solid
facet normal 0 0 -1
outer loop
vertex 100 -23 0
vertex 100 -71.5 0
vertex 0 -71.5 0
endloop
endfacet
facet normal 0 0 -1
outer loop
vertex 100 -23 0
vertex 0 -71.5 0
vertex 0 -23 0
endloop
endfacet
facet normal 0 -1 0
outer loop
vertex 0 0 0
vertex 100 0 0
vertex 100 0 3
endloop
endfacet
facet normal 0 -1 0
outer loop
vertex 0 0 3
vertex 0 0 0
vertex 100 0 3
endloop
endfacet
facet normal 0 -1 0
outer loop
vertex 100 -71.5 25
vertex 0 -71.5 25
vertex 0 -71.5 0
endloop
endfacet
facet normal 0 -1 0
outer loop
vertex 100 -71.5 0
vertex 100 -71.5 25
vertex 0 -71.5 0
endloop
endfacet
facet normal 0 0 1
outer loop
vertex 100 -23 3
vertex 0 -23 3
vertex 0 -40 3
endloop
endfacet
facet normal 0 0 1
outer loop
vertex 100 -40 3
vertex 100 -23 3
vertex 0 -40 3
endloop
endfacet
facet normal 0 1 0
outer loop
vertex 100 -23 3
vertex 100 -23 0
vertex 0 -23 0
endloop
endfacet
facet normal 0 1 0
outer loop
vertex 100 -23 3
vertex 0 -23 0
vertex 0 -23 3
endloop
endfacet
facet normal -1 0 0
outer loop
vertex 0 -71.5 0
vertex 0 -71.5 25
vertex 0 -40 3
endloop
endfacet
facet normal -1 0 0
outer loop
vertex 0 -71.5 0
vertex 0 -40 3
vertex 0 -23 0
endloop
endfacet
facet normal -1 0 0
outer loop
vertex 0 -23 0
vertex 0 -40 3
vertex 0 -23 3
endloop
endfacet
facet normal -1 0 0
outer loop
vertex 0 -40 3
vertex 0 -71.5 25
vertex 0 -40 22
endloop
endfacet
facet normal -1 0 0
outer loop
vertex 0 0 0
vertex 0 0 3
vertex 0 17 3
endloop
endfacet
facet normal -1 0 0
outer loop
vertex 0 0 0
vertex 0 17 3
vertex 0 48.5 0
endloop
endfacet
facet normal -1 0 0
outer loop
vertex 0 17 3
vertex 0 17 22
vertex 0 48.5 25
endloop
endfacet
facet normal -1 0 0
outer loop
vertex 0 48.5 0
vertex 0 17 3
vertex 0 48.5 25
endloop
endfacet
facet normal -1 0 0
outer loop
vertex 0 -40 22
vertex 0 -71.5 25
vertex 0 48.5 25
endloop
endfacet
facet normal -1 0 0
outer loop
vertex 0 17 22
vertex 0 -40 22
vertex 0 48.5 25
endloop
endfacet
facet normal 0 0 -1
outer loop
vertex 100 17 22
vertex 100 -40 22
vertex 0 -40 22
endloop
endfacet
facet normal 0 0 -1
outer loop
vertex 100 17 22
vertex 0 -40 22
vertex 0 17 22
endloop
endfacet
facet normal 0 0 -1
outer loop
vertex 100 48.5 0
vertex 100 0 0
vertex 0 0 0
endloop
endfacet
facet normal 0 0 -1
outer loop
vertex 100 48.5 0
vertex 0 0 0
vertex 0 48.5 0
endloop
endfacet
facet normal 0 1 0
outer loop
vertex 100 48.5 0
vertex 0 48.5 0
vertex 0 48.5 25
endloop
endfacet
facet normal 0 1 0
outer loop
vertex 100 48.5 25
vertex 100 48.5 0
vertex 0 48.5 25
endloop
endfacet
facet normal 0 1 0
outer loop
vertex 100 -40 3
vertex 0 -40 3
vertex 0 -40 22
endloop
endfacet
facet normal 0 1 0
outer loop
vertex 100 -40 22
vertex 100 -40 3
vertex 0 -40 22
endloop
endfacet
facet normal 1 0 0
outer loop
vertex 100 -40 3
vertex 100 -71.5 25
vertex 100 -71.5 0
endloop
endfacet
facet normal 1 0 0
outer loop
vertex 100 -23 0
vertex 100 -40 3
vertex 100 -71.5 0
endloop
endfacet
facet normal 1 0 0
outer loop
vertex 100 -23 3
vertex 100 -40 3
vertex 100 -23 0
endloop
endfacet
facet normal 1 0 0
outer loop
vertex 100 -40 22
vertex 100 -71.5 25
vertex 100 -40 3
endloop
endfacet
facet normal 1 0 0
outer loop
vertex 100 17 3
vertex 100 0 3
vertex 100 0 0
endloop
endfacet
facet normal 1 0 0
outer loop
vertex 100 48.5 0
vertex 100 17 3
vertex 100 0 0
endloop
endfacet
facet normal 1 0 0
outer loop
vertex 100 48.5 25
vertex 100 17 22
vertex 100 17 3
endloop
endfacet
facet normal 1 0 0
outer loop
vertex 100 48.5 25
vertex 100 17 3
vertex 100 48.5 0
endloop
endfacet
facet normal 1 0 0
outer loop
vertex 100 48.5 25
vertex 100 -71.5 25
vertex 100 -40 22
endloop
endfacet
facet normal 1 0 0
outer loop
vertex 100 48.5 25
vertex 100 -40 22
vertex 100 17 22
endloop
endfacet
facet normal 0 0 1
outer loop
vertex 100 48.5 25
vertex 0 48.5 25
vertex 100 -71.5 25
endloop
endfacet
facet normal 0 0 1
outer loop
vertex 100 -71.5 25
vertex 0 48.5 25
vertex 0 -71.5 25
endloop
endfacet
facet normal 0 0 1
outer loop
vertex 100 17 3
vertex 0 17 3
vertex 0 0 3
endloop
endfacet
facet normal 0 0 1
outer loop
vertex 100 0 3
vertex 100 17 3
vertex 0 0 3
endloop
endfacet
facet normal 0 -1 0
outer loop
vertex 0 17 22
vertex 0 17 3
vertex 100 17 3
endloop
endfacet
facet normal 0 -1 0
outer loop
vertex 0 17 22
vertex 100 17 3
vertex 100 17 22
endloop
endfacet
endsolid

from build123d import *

# Parameters (mm, degrees)
F0_W     = 17
F0_H     = 3
F0_W_2   = 57
F0_W_3   = 28.5
F0_H_2   = 19
F1_DEPTH = 100


# Not quite as in the source:
# - a feature of the source that left no trace in its solid (it failed there, or was rolled back) is left out


with BuildPart() as f1:
    # F0 (on Right) → F1 (new body)
    with BuildSketch(Plane.YZ):
        with Locations((-31.5, 1.5)):
            Rectangle(F0_W, F0_H)
        Polygon((-68.5, 22), (-40, 22), (-40, 25), (-71.5, 25), (-71.5, 0), (-40, 0), (-40, 3), (-68.5, 3), align=None)
        with Locations((-11.5, 23.5)):
            Rectangle(F0_W_2, F0_H)
        Polygon((17, 3), (17, 0), (48.5, 0), (48.5, 25), (17, 25), (17, 22), (45.5, 22), (45.5, 3), align=None)
        with Locations((8.5, 1.5)):
            Rectangle(F0_W, F0_H)
        with Locations((31.25, 12.5)):
            Rectangle(F0_W_3, F0_H_2)
        with Locations((-54.25, 12.5)):
            Rectangle(F0_W_3, F0_H_2)
    extrude(amount=F1_DEPTH)


solid = f1.part
